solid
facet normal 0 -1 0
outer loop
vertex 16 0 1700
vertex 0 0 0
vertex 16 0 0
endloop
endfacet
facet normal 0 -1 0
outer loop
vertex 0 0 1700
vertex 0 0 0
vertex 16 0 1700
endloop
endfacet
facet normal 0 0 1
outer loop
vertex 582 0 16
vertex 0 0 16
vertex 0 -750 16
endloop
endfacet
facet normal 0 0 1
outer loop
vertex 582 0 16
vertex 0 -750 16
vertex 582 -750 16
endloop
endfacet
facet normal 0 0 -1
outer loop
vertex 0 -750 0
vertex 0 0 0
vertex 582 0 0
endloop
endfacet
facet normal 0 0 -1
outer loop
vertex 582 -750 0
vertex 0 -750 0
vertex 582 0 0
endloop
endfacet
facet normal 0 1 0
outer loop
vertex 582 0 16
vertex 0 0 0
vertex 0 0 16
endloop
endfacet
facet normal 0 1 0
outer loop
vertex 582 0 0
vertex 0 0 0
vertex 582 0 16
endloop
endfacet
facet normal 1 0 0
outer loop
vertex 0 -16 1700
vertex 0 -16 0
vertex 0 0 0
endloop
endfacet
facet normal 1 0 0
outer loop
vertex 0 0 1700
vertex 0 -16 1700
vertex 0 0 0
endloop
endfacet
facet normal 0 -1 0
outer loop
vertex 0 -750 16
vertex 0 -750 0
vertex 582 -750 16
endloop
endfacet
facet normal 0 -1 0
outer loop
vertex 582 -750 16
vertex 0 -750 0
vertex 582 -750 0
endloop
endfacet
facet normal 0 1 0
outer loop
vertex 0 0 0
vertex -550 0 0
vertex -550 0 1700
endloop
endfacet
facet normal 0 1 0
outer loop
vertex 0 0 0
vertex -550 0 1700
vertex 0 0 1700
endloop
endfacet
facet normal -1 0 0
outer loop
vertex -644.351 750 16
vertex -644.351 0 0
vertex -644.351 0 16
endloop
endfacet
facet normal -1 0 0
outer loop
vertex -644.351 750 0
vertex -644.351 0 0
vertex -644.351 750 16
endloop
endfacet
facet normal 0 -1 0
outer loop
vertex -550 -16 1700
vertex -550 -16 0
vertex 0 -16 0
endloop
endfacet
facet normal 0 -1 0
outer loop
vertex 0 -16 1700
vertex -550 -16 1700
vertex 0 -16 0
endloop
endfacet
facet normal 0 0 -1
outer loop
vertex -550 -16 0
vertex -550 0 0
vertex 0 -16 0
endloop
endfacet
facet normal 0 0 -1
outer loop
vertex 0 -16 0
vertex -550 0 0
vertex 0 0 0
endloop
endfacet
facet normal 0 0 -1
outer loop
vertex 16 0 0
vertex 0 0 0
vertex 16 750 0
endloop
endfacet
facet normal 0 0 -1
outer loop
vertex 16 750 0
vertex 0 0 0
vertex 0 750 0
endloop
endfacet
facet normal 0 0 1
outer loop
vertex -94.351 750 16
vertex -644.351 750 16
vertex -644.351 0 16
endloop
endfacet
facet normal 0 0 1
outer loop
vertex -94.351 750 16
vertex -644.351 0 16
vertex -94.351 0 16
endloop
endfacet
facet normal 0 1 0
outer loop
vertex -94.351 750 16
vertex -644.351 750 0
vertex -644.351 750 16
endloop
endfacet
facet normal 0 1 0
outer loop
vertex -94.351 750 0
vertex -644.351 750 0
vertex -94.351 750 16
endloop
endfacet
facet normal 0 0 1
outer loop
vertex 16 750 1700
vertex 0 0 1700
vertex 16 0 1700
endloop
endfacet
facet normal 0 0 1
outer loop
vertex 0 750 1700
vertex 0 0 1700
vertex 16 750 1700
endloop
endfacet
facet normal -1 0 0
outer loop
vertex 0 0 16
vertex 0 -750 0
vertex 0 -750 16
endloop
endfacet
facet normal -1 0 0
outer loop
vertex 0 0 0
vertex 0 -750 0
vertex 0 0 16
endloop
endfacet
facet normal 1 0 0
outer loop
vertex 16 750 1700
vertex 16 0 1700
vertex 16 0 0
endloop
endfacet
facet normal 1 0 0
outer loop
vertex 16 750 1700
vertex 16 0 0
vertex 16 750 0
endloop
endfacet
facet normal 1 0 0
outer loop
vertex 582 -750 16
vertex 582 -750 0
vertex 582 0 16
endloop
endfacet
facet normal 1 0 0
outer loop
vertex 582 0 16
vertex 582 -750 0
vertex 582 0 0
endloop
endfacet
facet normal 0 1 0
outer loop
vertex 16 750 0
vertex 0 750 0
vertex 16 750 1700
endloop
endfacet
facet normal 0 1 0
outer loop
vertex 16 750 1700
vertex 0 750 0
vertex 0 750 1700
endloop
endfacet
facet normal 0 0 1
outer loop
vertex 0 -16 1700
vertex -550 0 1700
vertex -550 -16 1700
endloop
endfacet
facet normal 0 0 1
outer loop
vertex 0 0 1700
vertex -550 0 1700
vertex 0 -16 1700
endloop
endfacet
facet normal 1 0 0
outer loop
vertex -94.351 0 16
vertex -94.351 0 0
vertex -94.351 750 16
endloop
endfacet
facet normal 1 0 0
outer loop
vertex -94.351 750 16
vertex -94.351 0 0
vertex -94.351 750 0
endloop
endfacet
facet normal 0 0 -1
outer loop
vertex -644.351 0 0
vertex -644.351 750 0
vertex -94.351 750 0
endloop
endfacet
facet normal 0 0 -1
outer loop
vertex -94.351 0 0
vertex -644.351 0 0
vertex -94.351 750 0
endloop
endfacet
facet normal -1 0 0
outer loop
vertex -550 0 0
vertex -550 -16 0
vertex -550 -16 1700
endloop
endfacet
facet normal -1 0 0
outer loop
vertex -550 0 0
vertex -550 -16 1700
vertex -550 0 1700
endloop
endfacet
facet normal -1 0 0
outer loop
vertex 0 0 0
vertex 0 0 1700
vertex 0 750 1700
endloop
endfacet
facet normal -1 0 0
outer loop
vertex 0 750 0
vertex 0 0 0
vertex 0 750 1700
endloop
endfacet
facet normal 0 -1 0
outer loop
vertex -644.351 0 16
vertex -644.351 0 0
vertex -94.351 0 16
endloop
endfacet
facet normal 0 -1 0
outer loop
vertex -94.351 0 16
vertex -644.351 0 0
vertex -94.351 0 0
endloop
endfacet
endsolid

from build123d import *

# Parameters (mm, degrees)
F0_W     = 750
F0_H     = 1700
F1_DEPTH = 16
F2_W     = 550
F2_H     = 750
F3_DEPTH = 16
F4_W     = 550
F4_H     = 16
F5_DEPTH = 1700
F6_W     = 582
F6_H     = 750
F7_DEPTH = 16


with BuildPart() as f1:
    # F0 (on Right) → F1 (new body)
    with BuildSketch(Plane.YZ):
        with Locations((375, 850)):
            Rectangle(F0_W, F0_H)
    extrude(amount=F1_DEPTH)


with BuildPart() as f3:
    # F2 (on Top) → F3 (new body)
    with BuildSketch(Plane.XY):
        with Locations((-369.350799, 375)):
            Rectangle(F2_W, F2_H)
    extrude(amount=F3_DEPTH)


with BuildPart() as f5:
    # F4 (on Top) → F5 (new body)
    with BuildSketch(Plane.XY):
        with Locations((-275, -8)):
            Rectangle(F4_W, F4_H)
    extrude(amount=F5_DEPTH)


with BuildPart() as f7:
    # F6 (on Top) → F7 (new body)
    with BuildSketch(Plane.XY):
        with Locations((291, -375)):
            Rectangle(F6_W, F6_H)
    extrude(amount=F7_DEPTH)


solid = Compound([f1.part, f3.part, f5.part, f7.part])
